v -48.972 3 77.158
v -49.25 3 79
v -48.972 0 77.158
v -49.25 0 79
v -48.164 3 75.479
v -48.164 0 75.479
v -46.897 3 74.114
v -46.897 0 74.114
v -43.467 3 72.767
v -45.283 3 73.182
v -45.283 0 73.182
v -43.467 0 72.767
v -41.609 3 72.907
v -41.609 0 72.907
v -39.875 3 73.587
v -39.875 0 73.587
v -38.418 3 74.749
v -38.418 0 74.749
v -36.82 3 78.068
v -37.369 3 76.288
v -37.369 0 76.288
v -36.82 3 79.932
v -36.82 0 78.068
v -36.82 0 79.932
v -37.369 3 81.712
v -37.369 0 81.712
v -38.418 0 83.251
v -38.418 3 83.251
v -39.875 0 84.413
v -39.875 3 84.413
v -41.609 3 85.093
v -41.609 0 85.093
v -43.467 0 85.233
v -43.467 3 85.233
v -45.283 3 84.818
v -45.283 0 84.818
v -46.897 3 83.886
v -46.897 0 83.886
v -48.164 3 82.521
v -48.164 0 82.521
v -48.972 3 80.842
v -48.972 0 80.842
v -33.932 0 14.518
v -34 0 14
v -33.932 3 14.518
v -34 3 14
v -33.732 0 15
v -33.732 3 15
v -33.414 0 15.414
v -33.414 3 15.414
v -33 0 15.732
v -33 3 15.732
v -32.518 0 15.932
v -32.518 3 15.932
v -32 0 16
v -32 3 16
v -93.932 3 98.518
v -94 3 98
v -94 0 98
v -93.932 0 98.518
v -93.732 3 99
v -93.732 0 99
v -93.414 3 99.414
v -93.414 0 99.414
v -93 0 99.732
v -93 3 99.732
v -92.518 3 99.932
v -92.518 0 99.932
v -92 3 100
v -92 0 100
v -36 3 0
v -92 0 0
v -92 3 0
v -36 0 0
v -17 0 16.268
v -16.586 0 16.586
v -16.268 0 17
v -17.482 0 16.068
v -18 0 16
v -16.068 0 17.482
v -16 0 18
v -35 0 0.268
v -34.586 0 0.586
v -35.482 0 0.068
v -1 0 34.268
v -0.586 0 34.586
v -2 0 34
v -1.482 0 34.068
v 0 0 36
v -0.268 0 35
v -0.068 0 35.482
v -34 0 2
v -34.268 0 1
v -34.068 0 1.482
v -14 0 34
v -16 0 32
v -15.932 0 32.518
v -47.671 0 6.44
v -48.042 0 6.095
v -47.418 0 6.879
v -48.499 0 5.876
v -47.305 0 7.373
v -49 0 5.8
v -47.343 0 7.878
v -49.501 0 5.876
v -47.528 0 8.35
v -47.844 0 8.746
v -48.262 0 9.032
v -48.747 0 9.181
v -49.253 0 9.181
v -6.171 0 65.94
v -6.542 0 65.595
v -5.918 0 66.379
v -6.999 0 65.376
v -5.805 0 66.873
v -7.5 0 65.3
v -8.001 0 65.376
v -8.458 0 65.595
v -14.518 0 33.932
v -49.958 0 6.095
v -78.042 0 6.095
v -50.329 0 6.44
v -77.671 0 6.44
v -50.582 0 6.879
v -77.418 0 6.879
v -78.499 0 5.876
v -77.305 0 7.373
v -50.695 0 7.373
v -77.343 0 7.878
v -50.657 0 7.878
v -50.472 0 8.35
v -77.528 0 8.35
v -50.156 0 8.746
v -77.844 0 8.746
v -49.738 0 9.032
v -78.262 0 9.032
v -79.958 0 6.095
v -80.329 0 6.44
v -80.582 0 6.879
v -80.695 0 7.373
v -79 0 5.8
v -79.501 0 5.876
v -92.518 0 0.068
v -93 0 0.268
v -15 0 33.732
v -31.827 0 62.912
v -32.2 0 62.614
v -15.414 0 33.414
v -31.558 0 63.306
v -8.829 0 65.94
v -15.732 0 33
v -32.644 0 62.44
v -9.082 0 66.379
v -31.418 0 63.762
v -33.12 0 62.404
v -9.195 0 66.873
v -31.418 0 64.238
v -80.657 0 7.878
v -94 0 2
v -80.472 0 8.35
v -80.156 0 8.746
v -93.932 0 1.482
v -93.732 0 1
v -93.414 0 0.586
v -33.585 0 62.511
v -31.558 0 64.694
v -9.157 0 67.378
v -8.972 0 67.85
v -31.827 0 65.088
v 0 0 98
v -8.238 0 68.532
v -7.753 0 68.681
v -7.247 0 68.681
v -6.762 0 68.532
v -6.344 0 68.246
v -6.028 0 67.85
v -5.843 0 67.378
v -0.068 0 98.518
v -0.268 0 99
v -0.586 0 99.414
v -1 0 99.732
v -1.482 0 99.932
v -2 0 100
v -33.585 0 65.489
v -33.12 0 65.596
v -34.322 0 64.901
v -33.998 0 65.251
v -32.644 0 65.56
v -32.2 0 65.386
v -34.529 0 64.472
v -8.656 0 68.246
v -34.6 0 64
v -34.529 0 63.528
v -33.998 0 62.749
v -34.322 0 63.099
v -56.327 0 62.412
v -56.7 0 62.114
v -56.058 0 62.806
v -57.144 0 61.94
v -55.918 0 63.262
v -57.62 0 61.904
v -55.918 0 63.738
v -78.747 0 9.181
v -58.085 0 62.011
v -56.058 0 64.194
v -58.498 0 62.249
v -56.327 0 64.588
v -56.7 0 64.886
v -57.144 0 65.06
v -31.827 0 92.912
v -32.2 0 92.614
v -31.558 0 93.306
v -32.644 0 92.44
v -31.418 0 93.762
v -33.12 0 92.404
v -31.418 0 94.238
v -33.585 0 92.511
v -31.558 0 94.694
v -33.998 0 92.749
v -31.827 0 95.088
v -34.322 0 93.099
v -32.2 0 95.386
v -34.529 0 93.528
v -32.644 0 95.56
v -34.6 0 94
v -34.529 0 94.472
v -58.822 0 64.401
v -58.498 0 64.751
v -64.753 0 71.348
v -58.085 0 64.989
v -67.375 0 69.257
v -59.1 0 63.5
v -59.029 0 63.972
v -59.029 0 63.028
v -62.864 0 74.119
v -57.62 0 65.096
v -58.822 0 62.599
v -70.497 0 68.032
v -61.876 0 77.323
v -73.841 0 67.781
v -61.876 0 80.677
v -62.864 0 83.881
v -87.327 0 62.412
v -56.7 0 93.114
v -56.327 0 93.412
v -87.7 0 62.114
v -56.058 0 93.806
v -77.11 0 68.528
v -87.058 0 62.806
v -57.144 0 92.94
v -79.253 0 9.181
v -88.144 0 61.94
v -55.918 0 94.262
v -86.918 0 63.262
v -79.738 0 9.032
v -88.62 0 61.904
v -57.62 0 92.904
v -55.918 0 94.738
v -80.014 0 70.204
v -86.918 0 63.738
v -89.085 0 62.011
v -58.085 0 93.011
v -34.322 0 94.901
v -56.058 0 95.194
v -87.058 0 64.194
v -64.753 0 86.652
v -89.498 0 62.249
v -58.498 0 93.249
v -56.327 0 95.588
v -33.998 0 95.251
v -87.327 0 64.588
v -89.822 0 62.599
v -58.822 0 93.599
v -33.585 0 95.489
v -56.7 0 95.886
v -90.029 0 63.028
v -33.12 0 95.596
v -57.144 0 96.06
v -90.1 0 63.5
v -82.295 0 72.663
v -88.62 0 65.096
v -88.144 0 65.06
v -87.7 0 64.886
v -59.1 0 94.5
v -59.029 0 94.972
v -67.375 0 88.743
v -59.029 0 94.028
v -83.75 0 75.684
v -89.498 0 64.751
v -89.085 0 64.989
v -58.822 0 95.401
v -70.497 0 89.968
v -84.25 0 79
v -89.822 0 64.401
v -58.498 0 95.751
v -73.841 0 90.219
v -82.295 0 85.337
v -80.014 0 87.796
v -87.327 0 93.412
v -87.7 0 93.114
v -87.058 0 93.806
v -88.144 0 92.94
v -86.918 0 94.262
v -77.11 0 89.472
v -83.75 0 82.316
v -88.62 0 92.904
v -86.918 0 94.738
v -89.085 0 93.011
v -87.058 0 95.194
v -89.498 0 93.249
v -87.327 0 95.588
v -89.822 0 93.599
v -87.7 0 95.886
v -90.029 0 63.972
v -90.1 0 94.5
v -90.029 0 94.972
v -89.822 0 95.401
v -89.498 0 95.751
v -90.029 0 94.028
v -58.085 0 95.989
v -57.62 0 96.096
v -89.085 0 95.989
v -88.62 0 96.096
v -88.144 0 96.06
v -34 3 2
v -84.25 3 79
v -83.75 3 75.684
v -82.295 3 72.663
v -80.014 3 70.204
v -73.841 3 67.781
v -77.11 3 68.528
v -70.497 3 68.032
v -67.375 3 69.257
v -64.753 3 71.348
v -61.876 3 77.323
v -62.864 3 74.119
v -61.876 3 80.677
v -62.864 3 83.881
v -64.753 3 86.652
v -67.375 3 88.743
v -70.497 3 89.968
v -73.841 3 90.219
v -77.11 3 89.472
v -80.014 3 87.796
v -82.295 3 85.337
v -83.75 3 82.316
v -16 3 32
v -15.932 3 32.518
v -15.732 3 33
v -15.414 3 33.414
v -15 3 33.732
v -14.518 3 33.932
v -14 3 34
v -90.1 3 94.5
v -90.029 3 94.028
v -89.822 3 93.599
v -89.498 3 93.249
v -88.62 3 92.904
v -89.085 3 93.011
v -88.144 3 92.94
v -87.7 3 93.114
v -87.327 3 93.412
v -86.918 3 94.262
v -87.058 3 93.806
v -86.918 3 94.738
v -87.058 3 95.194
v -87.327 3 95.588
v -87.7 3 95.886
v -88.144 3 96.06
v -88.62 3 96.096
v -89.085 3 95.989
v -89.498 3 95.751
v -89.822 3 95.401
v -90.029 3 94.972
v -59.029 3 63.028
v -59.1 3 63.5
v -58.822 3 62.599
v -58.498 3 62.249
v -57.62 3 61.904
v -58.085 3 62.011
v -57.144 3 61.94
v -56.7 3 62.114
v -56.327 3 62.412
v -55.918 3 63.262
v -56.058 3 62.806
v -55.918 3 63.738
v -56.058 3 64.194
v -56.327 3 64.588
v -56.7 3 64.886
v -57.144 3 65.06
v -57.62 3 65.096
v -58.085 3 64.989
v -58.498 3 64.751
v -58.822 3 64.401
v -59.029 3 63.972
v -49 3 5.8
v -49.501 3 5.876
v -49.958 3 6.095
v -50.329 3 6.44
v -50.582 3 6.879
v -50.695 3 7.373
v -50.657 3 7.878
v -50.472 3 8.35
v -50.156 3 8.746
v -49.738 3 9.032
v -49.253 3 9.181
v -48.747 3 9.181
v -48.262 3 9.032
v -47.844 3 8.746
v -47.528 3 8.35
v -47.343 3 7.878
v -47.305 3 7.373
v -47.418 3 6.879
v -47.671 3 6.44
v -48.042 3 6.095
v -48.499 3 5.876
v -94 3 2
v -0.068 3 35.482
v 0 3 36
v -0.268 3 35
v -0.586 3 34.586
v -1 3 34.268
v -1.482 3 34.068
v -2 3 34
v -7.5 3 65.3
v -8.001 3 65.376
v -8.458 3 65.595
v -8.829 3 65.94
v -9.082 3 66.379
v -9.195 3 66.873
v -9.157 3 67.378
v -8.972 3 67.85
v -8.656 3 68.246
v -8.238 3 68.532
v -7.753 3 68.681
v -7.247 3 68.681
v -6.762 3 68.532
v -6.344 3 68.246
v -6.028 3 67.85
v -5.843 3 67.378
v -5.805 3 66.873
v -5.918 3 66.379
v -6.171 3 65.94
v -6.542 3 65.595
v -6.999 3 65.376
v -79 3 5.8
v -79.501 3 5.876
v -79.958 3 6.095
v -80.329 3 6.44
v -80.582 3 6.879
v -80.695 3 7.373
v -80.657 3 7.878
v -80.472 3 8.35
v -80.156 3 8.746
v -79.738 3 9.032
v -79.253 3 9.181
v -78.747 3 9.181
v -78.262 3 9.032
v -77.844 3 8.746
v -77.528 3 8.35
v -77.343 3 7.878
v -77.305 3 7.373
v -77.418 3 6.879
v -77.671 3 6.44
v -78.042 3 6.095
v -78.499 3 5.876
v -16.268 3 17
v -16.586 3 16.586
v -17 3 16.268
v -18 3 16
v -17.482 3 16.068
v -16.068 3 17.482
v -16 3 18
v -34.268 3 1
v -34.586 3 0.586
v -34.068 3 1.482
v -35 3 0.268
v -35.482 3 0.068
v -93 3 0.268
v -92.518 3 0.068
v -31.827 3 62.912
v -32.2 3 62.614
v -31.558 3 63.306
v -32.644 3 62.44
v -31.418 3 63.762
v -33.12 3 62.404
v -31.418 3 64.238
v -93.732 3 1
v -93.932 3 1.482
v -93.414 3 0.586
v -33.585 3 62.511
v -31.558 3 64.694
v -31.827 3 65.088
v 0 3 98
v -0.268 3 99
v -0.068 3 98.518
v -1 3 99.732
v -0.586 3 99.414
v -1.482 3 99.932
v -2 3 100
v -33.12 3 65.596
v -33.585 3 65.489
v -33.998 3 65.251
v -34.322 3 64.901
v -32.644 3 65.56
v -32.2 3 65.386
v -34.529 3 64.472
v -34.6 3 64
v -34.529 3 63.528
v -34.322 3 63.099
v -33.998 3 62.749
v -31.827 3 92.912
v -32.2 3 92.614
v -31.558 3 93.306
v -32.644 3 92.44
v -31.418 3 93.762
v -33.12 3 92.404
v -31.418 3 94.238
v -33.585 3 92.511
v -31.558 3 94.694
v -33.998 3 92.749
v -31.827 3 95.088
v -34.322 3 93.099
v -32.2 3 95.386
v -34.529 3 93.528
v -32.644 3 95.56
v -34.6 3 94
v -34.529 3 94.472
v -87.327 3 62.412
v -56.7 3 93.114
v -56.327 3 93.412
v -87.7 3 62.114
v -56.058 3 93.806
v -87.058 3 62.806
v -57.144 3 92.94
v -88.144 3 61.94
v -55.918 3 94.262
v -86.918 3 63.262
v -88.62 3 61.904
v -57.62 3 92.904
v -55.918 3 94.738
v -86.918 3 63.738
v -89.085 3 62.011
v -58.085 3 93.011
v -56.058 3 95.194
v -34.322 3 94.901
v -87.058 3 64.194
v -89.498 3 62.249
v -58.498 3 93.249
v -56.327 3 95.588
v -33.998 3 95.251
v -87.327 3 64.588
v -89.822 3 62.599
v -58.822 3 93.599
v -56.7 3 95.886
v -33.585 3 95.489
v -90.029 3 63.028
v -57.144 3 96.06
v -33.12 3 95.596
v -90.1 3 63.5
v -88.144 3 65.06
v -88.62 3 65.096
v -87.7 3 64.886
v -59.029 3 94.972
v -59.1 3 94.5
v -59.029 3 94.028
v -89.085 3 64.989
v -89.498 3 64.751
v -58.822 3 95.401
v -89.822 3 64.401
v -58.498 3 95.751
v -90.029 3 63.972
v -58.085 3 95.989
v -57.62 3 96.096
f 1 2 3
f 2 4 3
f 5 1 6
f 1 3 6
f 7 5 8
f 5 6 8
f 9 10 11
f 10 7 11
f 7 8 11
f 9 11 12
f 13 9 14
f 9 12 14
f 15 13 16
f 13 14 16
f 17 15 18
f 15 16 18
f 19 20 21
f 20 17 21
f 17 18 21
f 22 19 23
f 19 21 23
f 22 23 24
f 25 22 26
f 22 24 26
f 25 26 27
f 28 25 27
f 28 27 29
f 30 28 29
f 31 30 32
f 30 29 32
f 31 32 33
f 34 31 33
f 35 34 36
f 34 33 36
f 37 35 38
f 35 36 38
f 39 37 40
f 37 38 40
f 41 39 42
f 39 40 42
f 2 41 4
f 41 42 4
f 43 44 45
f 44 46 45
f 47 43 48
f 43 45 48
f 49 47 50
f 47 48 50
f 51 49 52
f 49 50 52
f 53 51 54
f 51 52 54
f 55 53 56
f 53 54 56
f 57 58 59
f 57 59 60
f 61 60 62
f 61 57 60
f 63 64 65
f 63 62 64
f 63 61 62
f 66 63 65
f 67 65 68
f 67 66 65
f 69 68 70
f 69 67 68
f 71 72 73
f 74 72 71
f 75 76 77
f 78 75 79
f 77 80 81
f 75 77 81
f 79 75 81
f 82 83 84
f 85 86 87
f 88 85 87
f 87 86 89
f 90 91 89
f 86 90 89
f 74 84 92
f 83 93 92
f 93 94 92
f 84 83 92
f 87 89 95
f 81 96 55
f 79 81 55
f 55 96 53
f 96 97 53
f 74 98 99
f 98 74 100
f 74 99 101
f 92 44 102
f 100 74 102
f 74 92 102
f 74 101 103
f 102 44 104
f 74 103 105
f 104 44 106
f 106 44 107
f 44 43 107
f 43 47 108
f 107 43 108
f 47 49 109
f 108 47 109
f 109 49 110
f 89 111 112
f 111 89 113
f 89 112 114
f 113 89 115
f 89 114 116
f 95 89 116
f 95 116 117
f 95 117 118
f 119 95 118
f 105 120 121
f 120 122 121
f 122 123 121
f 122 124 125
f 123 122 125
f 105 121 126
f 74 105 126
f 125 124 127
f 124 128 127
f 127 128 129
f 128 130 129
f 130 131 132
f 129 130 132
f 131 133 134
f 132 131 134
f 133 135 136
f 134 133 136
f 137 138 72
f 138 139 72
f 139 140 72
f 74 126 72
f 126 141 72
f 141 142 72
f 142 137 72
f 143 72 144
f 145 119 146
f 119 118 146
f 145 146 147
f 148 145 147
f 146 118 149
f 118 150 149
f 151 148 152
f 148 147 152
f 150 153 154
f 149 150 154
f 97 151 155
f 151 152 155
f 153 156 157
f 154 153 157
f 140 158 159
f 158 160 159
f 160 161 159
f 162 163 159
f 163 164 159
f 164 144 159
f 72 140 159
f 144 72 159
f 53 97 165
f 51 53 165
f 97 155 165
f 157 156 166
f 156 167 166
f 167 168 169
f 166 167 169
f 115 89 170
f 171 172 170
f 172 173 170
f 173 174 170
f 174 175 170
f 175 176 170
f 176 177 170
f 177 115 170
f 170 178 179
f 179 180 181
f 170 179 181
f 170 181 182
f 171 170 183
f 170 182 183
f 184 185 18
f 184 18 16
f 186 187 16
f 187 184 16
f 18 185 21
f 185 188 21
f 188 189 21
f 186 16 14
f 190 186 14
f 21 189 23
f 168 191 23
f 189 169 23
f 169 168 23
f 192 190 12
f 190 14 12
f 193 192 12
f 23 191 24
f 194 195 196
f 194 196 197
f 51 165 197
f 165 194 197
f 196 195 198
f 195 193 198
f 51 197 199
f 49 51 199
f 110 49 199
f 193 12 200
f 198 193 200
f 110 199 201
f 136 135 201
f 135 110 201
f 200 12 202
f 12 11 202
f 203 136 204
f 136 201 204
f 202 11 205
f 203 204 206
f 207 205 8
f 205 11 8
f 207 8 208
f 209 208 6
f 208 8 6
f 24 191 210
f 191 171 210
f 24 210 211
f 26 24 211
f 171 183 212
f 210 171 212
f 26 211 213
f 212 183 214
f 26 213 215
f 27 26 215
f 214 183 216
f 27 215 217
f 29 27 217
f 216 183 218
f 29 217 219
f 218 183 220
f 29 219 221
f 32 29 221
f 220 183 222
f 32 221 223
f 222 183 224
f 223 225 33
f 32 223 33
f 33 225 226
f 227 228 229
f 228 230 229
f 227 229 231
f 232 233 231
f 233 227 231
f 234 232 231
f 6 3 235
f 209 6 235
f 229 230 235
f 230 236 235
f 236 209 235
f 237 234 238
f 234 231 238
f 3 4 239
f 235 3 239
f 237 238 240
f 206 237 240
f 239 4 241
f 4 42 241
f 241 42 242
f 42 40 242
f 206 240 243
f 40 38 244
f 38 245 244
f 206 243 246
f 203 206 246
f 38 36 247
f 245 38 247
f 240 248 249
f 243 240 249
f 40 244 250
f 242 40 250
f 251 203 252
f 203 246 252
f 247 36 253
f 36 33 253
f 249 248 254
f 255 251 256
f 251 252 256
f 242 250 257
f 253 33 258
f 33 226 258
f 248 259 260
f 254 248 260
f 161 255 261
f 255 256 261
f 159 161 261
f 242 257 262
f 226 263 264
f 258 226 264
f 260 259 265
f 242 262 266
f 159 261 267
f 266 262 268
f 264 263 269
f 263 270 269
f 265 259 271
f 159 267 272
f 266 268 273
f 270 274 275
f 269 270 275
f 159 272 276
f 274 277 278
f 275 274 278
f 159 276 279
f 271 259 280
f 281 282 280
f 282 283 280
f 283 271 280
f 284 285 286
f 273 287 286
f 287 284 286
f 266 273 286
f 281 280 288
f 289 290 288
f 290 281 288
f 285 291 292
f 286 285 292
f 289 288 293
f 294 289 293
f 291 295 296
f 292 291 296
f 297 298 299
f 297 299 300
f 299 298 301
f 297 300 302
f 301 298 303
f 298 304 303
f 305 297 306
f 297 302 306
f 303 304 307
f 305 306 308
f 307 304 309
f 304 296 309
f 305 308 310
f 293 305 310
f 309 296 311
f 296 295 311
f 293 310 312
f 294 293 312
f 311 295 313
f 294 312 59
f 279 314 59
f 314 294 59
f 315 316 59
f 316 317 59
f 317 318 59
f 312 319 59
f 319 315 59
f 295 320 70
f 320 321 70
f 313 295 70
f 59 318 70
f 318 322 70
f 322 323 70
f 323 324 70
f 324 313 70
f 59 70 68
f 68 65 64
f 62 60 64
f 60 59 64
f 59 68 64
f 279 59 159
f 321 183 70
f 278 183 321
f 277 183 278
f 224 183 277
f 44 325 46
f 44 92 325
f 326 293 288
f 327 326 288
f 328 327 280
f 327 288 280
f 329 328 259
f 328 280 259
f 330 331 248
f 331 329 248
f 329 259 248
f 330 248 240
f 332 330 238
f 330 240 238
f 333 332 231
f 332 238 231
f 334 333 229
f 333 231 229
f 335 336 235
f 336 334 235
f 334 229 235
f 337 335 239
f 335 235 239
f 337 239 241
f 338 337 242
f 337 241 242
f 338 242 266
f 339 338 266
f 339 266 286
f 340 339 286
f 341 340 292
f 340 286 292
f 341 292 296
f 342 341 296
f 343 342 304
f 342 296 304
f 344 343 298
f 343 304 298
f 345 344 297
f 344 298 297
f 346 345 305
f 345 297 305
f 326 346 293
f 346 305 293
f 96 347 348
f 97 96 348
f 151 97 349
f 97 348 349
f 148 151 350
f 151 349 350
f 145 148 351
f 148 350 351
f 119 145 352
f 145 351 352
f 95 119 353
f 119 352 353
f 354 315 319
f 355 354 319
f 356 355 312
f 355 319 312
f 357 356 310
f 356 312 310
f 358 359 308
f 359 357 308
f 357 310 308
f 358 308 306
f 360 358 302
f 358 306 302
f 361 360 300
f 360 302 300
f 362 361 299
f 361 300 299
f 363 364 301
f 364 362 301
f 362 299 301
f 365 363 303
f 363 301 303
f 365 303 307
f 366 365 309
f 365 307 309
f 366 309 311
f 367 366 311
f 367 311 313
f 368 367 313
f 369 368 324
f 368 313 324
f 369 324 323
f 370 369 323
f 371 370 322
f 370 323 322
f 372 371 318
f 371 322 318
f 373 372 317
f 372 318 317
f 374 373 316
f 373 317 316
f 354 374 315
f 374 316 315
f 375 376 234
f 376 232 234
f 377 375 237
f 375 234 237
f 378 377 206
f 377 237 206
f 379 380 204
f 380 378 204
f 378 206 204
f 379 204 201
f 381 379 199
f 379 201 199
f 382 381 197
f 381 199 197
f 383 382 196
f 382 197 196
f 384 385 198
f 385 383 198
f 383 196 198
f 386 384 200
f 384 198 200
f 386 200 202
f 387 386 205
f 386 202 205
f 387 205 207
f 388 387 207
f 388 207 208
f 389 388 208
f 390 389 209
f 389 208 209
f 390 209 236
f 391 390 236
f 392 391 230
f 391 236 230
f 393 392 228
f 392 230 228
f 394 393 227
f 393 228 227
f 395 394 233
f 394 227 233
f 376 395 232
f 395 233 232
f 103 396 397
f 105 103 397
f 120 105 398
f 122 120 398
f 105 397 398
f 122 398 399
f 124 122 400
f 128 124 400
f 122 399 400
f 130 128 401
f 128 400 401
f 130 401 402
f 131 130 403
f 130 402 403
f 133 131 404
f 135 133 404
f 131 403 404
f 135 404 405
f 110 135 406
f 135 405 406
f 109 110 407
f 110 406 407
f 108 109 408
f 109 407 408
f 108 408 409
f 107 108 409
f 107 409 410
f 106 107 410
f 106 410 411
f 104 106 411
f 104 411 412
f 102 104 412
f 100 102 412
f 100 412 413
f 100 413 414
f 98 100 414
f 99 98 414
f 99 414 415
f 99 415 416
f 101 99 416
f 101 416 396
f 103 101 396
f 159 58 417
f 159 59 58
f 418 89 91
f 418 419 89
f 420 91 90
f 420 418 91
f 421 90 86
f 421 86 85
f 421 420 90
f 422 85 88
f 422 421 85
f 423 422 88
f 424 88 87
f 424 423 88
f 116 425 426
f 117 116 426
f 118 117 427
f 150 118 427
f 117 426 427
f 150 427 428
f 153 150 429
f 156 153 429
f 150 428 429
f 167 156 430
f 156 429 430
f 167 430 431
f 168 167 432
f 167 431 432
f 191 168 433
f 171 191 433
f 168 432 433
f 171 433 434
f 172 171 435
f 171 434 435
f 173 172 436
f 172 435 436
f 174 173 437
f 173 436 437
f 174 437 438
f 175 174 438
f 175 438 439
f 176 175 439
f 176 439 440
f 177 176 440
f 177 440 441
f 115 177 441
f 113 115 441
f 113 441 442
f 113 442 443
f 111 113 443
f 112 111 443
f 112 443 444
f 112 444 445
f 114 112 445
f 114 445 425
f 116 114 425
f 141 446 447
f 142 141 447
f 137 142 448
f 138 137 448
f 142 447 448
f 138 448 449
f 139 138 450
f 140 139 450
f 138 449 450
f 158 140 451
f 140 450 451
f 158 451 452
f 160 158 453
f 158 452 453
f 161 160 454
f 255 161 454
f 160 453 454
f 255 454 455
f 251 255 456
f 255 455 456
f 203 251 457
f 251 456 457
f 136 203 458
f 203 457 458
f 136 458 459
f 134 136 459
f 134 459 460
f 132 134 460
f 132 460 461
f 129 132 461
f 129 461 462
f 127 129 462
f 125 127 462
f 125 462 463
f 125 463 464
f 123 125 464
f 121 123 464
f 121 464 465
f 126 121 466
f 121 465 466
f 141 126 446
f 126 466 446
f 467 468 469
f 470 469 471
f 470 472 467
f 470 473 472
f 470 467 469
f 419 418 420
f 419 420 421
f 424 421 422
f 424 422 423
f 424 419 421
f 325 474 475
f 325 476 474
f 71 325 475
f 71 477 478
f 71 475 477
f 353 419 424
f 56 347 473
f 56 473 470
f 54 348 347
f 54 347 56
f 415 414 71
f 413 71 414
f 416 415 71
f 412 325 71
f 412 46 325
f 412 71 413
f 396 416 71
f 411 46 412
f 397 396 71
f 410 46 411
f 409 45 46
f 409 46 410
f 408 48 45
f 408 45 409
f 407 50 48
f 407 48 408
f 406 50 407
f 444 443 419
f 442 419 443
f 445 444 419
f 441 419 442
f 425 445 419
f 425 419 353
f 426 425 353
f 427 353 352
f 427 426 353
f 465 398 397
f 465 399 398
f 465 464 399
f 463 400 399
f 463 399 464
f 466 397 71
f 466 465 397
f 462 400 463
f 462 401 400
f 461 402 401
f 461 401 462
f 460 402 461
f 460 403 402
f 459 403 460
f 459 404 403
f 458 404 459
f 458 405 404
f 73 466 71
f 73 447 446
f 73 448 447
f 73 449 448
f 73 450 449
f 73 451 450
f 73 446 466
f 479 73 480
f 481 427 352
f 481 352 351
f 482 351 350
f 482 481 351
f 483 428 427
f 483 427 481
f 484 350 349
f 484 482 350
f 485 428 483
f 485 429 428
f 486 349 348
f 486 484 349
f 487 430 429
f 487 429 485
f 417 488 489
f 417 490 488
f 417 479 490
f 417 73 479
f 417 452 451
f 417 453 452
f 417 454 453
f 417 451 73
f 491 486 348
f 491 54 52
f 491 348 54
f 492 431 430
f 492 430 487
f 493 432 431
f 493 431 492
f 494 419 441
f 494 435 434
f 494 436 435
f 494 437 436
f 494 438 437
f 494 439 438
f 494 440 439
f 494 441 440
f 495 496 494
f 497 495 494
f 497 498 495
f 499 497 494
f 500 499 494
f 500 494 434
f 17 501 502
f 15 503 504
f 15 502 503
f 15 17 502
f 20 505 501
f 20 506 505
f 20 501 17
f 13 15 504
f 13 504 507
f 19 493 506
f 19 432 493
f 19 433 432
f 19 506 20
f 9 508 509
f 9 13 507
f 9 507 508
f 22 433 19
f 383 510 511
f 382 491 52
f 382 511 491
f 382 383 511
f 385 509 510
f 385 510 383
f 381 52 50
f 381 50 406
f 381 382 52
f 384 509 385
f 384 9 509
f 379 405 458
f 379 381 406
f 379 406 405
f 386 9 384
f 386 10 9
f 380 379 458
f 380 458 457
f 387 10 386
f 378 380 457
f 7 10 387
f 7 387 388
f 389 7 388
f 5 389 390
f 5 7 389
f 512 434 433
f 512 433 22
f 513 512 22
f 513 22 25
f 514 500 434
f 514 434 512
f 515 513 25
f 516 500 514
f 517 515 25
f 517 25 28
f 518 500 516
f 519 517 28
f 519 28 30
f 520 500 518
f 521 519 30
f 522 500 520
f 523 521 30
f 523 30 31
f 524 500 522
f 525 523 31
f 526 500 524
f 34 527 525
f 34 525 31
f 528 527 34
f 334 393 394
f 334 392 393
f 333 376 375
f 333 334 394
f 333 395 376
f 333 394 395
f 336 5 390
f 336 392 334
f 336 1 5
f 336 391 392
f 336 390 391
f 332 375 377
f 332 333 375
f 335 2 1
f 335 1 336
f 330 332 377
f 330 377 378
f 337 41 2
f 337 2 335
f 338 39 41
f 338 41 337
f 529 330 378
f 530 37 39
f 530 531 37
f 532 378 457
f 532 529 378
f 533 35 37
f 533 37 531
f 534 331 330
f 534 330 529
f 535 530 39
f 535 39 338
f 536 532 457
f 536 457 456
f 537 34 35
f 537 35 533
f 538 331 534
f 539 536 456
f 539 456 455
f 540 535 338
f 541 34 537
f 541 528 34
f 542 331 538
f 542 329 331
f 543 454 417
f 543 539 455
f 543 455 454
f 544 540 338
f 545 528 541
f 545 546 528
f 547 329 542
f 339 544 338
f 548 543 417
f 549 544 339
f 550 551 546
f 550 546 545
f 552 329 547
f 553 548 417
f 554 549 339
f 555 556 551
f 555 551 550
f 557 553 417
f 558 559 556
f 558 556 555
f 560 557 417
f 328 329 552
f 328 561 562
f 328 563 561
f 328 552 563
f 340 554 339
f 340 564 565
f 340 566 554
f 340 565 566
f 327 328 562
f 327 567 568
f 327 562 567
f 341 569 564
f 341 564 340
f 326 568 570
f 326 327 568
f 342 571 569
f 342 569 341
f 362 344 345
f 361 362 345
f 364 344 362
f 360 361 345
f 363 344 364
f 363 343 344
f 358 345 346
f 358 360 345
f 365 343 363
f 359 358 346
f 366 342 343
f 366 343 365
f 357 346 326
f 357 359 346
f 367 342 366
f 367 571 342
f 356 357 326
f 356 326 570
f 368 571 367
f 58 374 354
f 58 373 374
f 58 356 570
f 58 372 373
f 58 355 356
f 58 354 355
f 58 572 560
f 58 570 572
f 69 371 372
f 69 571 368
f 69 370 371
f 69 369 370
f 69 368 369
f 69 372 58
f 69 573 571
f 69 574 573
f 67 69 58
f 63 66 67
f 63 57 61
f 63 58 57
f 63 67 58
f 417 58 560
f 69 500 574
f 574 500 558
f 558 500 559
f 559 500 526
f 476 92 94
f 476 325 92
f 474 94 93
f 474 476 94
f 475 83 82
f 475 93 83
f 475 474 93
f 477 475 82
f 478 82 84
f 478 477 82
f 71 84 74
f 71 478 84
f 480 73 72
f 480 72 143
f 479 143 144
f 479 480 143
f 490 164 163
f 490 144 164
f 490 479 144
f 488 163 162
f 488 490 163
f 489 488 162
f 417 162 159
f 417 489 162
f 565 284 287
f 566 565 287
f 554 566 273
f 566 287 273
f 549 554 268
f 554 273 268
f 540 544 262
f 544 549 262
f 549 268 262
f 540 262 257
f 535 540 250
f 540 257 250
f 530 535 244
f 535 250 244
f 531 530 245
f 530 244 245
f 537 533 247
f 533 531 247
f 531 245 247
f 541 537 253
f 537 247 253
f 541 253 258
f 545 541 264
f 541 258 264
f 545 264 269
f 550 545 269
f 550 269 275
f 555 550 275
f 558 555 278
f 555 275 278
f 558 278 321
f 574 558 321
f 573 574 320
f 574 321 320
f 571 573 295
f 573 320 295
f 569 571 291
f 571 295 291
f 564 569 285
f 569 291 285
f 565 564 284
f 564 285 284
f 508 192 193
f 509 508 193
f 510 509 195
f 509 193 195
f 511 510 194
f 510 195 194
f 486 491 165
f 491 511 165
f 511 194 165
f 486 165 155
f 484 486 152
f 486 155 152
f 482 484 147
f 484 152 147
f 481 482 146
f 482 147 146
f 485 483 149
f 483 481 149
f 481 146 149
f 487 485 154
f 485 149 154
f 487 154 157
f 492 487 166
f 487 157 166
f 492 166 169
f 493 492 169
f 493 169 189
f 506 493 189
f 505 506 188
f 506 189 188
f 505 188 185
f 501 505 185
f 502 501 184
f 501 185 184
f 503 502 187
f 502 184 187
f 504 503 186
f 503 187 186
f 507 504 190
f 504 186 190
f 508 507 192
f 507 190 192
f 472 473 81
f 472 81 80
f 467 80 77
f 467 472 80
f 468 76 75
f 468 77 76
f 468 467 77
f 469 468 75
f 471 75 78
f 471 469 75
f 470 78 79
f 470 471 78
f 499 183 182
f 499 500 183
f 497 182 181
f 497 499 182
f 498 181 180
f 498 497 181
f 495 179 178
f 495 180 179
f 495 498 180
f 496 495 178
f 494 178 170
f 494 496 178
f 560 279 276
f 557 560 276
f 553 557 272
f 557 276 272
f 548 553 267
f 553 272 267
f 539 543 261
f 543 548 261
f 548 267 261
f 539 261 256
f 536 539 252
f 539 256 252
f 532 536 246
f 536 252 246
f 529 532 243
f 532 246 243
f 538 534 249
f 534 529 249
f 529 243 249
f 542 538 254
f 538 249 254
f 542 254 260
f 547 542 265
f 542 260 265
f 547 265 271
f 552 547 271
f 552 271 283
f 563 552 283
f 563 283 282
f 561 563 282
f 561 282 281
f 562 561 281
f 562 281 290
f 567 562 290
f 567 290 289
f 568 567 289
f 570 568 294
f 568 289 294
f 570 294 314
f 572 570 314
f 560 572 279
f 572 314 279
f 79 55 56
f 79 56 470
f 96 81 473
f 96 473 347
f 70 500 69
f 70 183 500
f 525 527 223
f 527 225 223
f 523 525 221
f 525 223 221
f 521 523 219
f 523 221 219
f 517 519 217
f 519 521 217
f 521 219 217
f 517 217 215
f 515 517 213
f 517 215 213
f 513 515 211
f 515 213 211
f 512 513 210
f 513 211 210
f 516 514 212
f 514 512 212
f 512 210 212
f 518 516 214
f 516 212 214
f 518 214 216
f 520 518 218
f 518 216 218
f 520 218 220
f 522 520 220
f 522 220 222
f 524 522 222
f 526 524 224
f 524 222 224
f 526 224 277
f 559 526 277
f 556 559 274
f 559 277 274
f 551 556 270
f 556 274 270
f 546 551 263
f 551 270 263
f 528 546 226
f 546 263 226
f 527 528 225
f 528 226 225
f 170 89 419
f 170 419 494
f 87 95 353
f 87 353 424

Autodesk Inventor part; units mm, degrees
ref_plane "YZ Plane" through (0, 0, 0) normal (1, 0, 0) x (0, 1, 0)
ref_plane "XZ Plane" through (0, 0, 0) normal (0, 1, 0) x (-1, 0, 0)
ref_plane "XY Plane" through (0, 0, 0) normal (0, 0, 1) x (1, 0, 0)
sketch "Sketch1" plane through (0, 0, 0) normal (0, 1, 0) x (-1, 0, 0)
  line L0 (0, 34) -> (0, 100)
  line L1 (0, 100) -> (94, 100)
  line L2 (94, 100) -> (94, 0)
  line L3 (94, 0) -> (34, 0)
  circle A0 centre (57.5, 94.5) radius 1.6
  circle A1 centre (88.5, 94.5) radius 1.6
  circle A2 centre (88.5, 63.5) radius 1.6
  circle A3 centre (57.5, 63.5) radius 1.6
  circle A4 centre (73, 79) radius 11.25
  circle A5 centre (43, 79) radius 6.25
  line L4 (34, 16) -> (16, 16)
  line L5 (16, 16) -> (16, 34)
  line L6 (34, 0) -> (34, 16)
  line L7 (16, 34) -> (0, 34)
  circle A6 centre (33, 64) radius 1.6
  circle A7 centre (33, 94) radius 1.6
  point P0 (0, 0)
  dimension "d3" = 100
  dimension "d4" = 60
  dimension "d5" = 31
  dimension "d6" = 31
  dimension "d7" = 15.5
  dimension "d8" = 15.5
  dimension "d9" = 22.5
  dimension "d10" = 21
  dimension "d11" = 12.5
  dimension "d12" = 21
  dimension "d13" = 3.2
  dimension "d14" = 30
  dimension "d15" = 16
  dimension "d16" = 34
  dimension "d17" = 34
  dimension "d18" = 15
  dimension "d19" = 15
  dimension "d20" = 10
extrude "Extrusion1" add sketch "Sketch1" along normal blind 3
fillet "Fillet1" radius 2 8 edges at (-16, 1.5, 34) (-34, 1.5, 16) (-16, 1.5, 16) (0, 1.5, 34) (-34, 1.5, 0) (0, 1.5, 100) (-94, 1.5, 100) (-94, 1.5, 0)
sketch "Sketch2" plane through (0, 0, 0) normal (0, -1, 0) x (1, 0, 0)
  arc A0 (-94, 2) -> (-92, 0) centre (-92, 2) ccw projected
  line L0 (-36, 0) -> (-92, 0) projected
  arc A1 (-36, 0) -> (-34, 2) centre (-36, 2) ccw projected
  line L1 (-34, 14) -> (-34, 2) projected
  arc A2 (-32, 16) -> (-34, 14) centre (-32, 14) ccw projected
  line L2 (-18, 16) -> (-32, 16) projected
  arc A3 (-18, 16) -> (-16, 18) centre (-18, 18) ccw projected
  line L3 (-16, 32) -> (-16, 18) projected
  arc A4 (-14, 34) -> (-16, 32) centre (-14, 32) ccw projected
  line L4 (-2, 34) -> (-14, 34) projected
  arc A5 (-2, 34) -> (0, 36) centre (-2, 36) ccw projected
  line L5 (0, 98) -> (0, 36) projected
  arc A6 (0, 98) -> (-2, 100) centre (-2, 98) ccw projected
  line L6 (-92, 100) -> (-2, 100) projected
  arc A7 (-92, 100) -> (-94, 98) centre (-92, 98) ccw projected
  line L7 (-94, 2) -> (-94, 98) projected
  circle A8 centre (-33, 94) radius 1.6 projected
  circle A9 centre (-33, 64) radius 1.6 projected
  circle A10 centre (-43, 79) radius 6.25 projected
  circle A11 centre (-73, 79) radius 11.25 projected
  circle A12 centre (-57.5, 63.5) radius 1.6 projected
  circle A13 centre (-88.5, 63.5) radius 1.6 projected
  circle A14 centre (-88.5, 94.5) radius 1.6 projected
  circle A15 centre (-57.5, 94.5) radius 1.6 projected
  point P0 (0, 0)
  point P1 (-7.5, 67)
  point P2 (-49, 7.5)
  point P3 (-79, 7.5)
  point P4 (0, 67)
  dimension "d22" = 7.5
  dimension "d23" = 7.5
  dimension "d24" = 15
  dimension "d25" = 15
hole "Hole1" at (-7.5, 0, 67) at (-49, 0, 7.5) at (-79, 0, 7.5) direction (0, 1, 0) diameter 3.4 end through all clearance for "Countersunk Flat Head Screw ISO 2009/7046" size "M3" standard "ISO"
equation "\"d6\" = d5"
equation "\"d7\" = 0.5 * d6"
equation "\"d8\" = 0.5 * d5"
equation "\"d19\" = d18"
equation "\"d23\" = d22"
equation "\"d25\" = d24"
properties part number "Z Axis Motor Mount" material "Aluminum 6061"
